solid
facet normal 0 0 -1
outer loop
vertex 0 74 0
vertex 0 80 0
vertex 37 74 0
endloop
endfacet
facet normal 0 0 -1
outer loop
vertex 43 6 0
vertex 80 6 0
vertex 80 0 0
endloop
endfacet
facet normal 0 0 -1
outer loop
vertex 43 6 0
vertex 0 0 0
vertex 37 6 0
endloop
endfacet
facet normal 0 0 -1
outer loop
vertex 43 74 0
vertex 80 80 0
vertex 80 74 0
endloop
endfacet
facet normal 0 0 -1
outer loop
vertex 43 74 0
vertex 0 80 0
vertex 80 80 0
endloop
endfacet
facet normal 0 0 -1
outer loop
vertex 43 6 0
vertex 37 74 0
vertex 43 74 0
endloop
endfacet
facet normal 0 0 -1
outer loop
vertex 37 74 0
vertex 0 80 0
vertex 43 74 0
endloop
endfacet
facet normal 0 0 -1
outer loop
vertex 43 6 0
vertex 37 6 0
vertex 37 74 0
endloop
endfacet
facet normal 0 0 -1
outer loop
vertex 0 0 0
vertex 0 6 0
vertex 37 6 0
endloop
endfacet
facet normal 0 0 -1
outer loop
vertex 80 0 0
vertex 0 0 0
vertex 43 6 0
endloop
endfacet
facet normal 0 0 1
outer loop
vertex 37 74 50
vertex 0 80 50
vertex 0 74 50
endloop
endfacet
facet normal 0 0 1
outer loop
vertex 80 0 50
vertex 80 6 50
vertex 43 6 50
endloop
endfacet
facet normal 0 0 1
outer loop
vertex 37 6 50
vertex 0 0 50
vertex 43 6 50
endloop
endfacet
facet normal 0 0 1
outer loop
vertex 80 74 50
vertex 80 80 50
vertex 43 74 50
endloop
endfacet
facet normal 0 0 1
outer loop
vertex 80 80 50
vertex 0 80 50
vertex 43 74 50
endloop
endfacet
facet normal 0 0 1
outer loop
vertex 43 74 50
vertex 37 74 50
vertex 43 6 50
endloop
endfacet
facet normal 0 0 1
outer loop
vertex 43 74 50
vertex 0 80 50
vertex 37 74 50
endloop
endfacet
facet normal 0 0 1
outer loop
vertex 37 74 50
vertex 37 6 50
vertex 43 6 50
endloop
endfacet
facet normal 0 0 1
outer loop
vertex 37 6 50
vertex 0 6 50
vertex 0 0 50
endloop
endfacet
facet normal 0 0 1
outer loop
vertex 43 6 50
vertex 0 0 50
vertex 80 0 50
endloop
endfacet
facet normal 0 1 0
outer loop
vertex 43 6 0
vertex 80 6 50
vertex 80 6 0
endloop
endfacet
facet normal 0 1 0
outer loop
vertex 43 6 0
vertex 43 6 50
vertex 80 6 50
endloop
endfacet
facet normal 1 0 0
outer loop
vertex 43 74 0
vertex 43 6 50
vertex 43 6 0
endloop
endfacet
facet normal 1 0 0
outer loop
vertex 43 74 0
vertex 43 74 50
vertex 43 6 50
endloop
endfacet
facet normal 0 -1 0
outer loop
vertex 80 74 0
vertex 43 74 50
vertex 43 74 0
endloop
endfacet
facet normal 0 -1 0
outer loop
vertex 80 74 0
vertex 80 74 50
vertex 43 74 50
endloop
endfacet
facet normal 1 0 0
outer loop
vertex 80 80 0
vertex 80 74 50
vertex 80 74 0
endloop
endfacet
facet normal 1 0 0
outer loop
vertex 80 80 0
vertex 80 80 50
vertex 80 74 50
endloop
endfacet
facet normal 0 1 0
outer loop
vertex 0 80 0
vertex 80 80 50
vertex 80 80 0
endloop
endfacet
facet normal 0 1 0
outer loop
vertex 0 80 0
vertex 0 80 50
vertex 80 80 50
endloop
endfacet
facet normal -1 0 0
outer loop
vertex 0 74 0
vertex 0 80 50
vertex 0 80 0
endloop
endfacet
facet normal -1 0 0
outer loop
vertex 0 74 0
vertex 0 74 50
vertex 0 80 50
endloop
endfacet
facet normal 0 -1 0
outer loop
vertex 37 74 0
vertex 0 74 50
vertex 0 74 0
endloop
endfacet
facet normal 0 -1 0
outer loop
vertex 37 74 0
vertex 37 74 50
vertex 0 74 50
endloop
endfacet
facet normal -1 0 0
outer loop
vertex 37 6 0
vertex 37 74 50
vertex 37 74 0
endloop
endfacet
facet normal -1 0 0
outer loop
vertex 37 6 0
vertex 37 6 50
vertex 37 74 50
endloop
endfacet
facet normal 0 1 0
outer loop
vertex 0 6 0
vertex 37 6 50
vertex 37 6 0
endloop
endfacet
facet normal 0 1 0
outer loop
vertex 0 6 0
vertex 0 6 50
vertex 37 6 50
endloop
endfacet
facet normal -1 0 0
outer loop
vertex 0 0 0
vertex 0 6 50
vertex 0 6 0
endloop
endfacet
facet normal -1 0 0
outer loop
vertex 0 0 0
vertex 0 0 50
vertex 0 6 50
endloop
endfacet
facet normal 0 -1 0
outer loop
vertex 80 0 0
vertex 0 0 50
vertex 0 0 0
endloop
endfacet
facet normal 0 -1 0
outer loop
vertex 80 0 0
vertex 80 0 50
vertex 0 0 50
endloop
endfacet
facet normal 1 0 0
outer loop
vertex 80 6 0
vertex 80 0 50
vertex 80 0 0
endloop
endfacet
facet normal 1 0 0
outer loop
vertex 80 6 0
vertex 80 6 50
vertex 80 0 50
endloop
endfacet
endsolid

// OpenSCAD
$fn = 32;

// ----------------------------------------------------------------------
// Structural section: ibeam 80 x 80 mm
// ----------------------------------------------------------------------

// --- parameters (mm) ---
sec_w = 80;               // section width, X
sec_h = 80;               // section height, Y
flange_t = 6;             // flange thickness
web_t = 6;                // web thickness
plate_t = 50;             // cut length, Z (extrusion height)

profile = [[0, 0], [80, 0], [80, 6], [43, 6], [43, 74], [80, 74], [80, 80], [0, 80], [0, 74], [37, 74], [37, 6], [0, 6]];  // primary outline, 12 points, counter clockwise

// --- the one profile operation ---
linear_extrude(height = plate_t) polygon(points = profile);
